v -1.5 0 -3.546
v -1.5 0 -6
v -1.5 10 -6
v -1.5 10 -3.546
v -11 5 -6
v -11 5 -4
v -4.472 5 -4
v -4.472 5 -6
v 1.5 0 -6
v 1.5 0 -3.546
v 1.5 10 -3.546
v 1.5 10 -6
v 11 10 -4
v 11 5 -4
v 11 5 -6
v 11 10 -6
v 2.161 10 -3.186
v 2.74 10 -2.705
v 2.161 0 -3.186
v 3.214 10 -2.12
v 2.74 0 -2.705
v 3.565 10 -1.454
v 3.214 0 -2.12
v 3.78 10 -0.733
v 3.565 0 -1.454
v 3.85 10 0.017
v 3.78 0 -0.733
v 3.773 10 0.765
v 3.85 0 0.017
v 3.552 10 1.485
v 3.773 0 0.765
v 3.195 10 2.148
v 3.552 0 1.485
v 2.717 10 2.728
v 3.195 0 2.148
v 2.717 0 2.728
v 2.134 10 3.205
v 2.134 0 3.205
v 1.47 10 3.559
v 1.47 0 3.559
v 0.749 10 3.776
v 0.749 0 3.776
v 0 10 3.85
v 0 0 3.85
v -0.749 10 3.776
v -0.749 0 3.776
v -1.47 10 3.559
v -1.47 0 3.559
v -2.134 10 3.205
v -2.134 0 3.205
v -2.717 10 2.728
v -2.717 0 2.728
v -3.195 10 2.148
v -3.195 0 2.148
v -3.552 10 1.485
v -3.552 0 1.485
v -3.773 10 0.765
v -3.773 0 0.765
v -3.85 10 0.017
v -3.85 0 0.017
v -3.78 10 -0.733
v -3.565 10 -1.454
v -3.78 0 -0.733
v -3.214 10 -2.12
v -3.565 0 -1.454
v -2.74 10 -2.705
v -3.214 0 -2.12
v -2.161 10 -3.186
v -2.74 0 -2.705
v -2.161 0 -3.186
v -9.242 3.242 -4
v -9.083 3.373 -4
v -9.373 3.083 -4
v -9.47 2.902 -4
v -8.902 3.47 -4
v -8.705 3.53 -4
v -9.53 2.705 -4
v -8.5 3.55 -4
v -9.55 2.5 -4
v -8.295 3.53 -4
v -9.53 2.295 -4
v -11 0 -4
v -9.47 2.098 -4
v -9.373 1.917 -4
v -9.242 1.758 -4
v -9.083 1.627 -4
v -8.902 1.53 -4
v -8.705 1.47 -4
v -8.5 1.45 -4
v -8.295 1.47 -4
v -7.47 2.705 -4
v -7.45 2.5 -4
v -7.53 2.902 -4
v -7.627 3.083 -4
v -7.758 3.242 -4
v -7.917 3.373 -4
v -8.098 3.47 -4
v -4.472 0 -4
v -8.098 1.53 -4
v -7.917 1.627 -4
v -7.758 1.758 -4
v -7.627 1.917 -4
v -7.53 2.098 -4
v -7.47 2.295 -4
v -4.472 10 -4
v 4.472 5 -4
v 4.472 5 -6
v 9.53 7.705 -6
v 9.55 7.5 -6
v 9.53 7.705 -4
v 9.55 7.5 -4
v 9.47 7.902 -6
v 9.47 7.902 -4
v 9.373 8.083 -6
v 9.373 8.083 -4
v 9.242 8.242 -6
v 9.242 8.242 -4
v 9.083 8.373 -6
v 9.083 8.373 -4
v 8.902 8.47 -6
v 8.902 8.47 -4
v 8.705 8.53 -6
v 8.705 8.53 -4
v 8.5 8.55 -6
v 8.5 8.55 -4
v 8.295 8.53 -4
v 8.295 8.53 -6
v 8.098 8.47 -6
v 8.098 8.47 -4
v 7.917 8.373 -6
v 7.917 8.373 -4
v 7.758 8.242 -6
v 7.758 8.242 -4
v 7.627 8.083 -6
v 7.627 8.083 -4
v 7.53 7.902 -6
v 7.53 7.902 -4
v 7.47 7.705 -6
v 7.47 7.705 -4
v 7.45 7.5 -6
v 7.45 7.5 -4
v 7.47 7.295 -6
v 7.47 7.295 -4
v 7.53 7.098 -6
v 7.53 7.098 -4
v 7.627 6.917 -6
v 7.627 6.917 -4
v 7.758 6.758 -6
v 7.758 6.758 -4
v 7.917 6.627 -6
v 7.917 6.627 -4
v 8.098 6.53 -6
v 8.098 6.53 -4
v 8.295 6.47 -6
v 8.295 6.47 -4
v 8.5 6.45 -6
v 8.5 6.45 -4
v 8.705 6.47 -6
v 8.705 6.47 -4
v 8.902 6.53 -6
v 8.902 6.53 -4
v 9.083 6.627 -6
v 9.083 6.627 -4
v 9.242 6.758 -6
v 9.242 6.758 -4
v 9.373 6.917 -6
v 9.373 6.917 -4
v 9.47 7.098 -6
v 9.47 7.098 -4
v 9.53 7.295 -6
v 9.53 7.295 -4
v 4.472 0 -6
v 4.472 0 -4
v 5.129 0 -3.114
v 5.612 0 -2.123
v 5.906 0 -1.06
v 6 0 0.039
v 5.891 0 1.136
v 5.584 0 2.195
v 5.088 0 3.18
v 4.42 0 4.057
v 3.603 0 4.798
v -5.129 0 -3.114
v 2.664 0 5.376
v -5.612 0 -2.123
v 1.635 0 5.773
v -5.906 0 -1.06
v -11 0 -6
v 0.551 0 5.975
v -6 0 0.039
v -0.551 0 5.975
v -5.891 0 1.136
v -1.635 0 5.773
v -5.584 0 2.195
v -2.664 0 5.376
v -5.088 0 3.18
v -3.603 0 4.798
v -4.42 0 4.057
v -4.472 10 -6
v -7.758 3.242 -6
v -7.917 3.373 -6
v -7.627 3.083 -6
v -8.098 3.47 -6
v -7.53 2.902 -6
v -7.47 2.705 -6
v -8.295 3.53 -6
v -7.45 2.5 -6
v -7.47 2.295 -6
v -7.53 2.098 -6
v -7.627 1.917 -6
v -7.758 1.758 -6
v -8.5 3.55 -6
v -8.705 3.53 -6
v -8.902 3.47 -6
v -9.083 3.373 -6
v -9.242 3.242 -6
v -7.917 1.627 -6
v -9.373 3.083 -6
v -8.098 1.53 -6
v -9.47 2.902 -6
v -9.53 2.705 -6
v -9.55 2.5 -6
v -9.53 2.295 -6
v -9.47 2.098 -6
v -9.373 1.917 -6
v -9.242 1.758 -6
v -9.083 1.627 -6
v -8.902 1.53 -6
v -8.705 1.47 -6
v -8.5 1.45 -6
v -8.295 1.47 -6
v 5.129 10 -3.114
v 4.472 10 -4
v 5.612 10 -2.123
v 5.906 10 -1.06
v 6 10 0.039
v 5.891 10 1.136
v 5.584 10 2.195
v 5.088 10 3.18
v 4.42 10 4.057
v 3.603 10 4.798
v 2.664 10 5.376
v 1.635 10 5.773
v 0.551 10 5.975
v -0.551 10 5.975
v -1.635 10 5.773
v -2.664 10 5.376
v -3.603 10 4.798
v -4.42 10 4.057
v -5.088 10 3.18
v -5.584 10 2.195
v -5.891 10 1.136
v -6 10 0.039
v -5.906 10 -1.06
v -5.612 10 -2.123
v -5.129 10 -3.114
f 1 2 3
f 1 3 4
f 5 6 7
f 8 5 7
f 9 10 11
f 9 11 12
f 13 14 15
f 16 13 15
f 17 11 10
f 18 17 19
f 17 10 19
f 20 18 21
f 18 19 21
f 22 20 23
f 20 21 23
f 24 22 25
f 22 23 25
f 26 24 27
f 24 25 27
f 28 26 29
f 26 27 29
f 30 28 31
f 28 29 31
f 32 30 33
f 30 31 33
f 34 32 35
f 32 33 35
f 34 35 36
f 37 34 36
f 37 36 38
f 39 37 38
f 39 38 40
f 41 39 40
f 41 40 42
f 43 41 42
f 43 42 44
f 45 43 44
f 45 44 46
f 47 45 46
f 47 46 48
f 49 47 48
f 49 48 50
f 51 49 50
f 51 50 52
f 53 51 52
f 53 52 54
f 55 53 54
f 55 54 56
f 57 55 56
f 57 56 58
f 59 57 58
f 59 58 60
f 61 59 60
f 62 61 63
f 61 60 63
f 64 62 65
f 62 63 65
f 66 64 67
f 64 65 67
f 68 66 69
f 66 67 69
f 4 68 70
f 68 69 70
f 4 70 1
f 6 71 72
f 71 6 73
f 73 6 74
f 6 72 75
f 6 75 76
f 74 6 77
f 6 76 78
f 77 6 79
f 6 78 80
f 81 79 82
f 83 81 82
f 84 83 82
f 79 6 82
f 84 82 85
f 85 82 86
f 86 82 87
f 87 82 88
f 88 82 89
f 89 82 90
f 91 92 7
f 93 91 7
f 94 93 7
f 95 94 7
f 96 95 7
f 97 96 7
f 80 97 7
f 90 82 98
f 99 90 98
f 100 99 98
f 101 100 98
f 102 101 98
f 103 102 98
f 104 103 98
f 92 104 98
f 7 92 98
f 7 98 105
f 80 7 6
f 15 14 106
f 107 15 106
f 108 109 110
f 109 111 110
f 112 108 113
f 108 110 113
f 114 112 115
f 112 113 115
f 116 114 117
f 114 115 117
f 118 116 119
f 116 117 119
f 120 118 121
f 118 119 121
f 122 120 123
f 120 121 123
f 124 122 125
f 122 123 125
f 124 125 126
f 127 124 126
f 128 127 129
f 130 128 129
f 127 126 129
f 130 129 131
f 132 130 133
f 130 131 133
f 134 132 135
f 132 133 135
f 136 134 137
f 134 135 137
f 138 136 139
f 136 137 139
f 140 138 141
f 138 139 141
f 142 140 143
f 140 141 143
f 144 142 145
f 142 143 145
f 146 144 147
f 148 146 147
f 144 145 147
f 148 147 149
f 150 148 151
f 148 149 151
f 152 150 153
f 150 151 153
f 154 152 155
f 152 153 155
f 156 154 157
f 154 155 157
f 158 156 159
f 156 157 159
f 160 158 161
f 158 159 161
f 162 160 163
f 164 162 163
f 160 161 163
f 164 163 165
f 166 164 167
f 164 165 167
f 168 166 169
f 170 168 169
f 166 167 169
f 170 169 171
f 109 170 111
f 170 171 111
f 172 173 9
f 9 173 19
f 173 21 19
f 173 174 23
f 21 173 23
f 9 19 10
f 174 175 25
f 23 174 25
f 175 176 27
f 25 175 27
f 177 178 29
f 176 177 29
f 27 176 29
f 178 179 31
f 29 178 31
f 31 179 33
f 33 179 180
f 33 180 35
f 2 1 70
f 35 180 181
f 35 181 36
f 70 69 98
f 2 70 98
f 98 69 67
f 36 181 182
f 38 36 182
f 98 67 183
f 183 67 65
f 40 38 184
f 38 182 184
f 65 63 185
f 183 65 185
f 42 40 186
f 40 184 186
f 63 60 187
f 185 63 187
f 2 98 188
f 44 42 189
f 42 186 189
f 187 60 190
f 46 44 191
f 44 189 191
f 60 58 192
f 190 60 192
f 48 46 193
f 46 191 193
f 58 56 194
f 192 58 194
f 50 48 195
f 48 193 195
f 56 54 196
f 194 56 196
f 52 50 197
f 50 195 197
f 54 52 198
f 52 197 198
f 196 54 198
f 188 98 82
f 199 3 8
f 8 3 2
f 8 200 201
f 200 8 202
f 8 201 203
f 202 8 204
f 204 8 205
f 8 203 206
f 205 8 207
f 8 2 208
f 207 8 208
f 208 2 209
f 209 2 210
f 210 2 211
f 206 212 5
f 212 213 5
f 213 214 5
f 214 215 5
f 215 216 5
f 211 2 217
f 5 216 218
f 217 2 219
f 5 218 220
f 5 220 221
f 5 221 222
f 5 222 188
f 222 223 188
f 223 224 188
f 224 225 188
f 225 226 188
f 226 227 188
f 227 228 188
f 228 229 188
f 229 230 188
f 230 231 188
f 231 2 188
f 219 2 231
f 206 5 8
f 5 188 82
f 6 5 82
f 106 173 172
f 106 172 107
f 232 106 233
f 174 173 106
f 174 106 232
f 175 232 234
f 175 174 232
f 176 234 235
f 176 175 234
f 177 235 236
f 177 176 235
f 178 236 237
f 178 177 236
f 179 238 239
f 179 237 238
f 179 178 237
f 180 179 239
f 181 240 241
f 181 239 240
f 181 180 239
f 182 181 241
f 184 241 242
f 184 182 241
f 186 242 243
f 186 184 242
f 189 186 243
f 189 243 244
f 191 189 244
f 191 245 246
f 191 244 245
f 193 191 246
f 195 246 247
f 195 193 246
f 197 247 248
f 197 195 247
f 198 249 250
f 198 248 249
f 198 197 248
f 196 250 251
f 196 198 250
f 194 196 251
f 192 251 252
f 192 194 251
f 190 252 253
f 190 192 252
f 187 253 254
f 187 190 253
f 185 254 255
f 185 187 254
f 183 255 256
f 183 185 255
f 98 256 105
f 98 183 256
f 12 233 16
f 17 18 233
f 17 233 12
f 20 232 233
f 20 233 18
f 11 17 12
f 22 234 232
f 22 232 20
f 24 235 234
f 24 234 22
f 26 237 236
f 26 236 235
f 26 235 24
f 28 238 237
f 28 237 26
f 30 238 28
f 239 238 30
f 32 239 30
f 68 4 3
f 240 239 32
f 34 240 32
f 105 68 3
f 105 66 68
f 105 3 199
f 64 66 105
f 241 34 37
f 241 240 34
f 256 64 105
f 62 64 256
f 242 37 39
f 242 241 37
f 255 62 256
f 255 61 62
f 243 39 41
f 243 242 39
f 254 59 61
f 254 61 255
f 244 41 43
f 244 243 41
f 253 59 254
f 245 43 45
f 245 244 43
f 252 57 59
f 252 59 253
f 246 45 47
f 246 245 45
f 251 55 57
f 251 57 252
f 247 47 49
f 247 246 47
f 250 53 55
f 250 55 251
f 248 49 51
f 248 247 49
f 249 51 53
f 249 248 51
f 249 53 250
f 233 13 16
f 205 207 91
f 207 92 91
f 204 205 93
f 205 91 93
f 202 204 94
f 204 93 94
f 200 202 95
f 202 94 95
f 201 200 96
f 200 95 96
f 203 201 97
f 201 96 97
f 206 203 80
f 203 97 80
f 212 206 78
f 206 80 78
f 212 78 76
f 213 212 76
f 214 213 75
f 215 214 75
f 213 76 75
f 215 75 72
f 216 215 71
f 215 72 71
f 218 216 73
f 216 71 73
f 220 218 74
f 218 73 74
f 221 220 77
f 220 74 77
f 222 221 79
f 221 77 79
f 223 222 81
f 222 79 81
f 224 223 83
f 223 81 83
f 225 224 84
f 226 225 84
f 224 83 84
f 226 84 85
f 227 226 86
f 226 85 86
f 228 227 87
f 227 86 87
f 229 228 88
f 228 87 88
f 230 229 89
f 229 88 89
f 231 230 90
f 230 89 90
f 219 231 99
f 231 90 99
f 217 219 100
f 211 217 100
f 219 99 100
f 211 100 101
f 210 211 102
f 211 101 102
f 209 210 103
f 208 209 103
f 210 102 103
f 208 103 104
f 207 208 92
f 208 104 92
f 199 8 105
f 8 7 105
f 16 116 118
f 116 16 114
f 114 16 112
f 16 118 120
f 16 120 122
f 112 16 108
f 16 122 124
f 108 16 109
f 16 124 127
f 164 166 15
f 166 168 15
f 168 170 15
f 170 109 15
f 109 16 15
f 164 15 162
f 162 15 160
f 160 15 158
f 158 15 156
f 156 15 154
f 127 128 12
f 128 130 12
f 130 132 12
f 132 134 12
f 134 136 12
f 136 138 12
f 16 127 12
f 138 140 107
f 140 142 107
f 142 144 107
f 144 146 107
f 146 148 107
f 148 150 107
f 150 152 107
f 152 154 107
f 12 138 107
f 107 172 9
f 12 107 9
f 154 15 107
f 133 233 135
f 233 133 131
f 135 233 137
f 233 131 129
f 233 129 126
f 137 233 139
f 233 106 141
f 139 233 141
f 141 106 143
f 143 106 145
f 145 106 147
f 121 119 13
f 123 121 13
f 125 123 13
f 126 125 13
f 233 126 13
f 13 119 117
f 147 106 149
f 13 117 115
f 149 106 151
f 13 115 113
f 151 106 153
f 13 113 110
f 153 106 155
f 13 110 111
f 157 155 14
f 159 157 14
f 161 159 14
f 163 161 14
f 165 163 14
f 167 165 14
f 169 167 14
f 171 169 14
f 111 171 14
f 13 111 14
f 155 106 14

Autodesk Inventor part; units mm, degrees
ref_plane "YZ Plane" through (0, 0, 0) normal (1, 0, 0) x (0, 1, 0)
ref_plane "XZ Plane" through (0, 0, 0) normal (0, 1, 0) x (-1, 0, 0)
ref_plane "XY Plane" through (0, 0, 0) normal (0, 0, 1) x (1, 0, 0)
sketch "スケッチ3" plane through (0, 0, 0) normal (0, 1, 0) x (-1, 0, 0)
  circle A0 centre (0, 0) radius 3.85
  line L0 (11, -4) -> (4.4721, -4)
  line L1 (-11, -4) -> (-11, -6)
  line L2 (-11, -6) -> (11, -6)
  line L3 (11, -6) -> (11, -4)
  arc A1 (4.4721, -4) -> (-4.4721, -4) centre (0, 0) ccw
  line L4 (-4.4721, -4) -> (-11, -4)
  point P0 (0, -4)
  point P1 (0, -6)
  dimension "d12" = 7.7
  dimension "d14" = 22
  dimension "d15" = 2
  dimension "d16" = 6
extrude "押し出し3" add sketch "スケッチ3" along normal blind 10
sketch "スケッチ4" plane through (4.4721, 0, -4) normal (0, 0, 1) x (1, 0, 0)
  circle A0 centre (4.0279, 7.5) radius 1.05
  circle A1 centre (-12.9721, 2.5) radius 1.05
  line L0 (-15.4721, 0) -> (-15.4721, 10) projected
  line L1 (6.5279, 0) -> (6.5279, 10) projected
  line L2 (0, 10) -> (6.5279, 10) projected
  line L3 (-15.4721, 0) -> (-8.9443, 0) projected
  line L4 (0, 0) -> (0, 10) projected
  line L5 (0, 0) -> (6.5279, 0) projected
  line L6 (0, 0) -> (6.5279, 0) projected
  line L7 (6.5279, 0) -> (6.5279, 10) projected
  line L8 (0, 10) -> (6.5279, 10) projected
  line L9 (0, 0) -> (0, 10) projected
  line L10 (6.5279, 5) -> (0, 5)
  line L11 (0, 0) -> (6.5279, 0) projected
  line L12 (6.5279, 5) -> (6.5279, 0)
  line L13 (6.5279, 0) -> (0, 0)
  line L14 (1.5279, 0) -> (-10.4721, 0) projected
  line L15 (0, 0) -> (0, 5)
  line L16 (-15.4721, 0) -> (-8.9443, 0) projected
  line L17 (-8.9443, 0) -> (-8.9443, 10) projected
  line L18 (-15.4721, 10) -> (-8.9443, 10) projected
  line L19 (-15.4721, 0) -> (-15.4721, 10) projected
  line L20 (-15.4721, 0) -> (-15.4721, 10) projected
  line L21 (-15.4721, 10) -> (-8.9443, 10) projected
  line L22 (-15.4721, 5) -> (-8.9443, 5)
  line L23 (-8.9443, 5) -> (-8.9443, 10)
  line L24 (-8.9443, 10) -> (-15.4721, 10)
  line L25 (-15.4721, 10) -> (-15.4721, 5)
  point P0 (-4.4721, 0)
  dimension "d19" = 2.1
  dimension "d20" = 2.1
  dimension "d21" = 2.5
  dimension "d22" = 2.5
  dimension "d29" = 2.5
  dimension "d30" = 2.5
  dimension "d35" = 17
extrude "押し出し4" cut sketch "スケッチ4" against normal blind 10 contours A0 | A1
sketch "スケッチ5" plane through (0, 10, 0) normal (0, 1, 0) x (1, 0, 0)
  line L0 (-1.5, 0) -> (1.5, 0)
  line L1 (1.5, 0) -> (1.5, 10)
  line L2 (1.5, 10) -> (-1.5, 10)
  line L3 (-1.5, 10) -> (-1.5, 0)
  point P0 (0, 0)
  point P1 (0, 0)
  dimension "d25" = 3
  dimension "d26" = 10
extrude "押し出し5" cut sketch "スケッチ5" against normal blind 10
extrude "押し出し6" cut sketch "スケッチ4" against normal blind 2 contours L4 L10 L1 L5
extrude "押し出し7" cut sketch "スケッチ4" against normal blind 2 contours L0 L18 L17 L22
properties part number "Ω型"
